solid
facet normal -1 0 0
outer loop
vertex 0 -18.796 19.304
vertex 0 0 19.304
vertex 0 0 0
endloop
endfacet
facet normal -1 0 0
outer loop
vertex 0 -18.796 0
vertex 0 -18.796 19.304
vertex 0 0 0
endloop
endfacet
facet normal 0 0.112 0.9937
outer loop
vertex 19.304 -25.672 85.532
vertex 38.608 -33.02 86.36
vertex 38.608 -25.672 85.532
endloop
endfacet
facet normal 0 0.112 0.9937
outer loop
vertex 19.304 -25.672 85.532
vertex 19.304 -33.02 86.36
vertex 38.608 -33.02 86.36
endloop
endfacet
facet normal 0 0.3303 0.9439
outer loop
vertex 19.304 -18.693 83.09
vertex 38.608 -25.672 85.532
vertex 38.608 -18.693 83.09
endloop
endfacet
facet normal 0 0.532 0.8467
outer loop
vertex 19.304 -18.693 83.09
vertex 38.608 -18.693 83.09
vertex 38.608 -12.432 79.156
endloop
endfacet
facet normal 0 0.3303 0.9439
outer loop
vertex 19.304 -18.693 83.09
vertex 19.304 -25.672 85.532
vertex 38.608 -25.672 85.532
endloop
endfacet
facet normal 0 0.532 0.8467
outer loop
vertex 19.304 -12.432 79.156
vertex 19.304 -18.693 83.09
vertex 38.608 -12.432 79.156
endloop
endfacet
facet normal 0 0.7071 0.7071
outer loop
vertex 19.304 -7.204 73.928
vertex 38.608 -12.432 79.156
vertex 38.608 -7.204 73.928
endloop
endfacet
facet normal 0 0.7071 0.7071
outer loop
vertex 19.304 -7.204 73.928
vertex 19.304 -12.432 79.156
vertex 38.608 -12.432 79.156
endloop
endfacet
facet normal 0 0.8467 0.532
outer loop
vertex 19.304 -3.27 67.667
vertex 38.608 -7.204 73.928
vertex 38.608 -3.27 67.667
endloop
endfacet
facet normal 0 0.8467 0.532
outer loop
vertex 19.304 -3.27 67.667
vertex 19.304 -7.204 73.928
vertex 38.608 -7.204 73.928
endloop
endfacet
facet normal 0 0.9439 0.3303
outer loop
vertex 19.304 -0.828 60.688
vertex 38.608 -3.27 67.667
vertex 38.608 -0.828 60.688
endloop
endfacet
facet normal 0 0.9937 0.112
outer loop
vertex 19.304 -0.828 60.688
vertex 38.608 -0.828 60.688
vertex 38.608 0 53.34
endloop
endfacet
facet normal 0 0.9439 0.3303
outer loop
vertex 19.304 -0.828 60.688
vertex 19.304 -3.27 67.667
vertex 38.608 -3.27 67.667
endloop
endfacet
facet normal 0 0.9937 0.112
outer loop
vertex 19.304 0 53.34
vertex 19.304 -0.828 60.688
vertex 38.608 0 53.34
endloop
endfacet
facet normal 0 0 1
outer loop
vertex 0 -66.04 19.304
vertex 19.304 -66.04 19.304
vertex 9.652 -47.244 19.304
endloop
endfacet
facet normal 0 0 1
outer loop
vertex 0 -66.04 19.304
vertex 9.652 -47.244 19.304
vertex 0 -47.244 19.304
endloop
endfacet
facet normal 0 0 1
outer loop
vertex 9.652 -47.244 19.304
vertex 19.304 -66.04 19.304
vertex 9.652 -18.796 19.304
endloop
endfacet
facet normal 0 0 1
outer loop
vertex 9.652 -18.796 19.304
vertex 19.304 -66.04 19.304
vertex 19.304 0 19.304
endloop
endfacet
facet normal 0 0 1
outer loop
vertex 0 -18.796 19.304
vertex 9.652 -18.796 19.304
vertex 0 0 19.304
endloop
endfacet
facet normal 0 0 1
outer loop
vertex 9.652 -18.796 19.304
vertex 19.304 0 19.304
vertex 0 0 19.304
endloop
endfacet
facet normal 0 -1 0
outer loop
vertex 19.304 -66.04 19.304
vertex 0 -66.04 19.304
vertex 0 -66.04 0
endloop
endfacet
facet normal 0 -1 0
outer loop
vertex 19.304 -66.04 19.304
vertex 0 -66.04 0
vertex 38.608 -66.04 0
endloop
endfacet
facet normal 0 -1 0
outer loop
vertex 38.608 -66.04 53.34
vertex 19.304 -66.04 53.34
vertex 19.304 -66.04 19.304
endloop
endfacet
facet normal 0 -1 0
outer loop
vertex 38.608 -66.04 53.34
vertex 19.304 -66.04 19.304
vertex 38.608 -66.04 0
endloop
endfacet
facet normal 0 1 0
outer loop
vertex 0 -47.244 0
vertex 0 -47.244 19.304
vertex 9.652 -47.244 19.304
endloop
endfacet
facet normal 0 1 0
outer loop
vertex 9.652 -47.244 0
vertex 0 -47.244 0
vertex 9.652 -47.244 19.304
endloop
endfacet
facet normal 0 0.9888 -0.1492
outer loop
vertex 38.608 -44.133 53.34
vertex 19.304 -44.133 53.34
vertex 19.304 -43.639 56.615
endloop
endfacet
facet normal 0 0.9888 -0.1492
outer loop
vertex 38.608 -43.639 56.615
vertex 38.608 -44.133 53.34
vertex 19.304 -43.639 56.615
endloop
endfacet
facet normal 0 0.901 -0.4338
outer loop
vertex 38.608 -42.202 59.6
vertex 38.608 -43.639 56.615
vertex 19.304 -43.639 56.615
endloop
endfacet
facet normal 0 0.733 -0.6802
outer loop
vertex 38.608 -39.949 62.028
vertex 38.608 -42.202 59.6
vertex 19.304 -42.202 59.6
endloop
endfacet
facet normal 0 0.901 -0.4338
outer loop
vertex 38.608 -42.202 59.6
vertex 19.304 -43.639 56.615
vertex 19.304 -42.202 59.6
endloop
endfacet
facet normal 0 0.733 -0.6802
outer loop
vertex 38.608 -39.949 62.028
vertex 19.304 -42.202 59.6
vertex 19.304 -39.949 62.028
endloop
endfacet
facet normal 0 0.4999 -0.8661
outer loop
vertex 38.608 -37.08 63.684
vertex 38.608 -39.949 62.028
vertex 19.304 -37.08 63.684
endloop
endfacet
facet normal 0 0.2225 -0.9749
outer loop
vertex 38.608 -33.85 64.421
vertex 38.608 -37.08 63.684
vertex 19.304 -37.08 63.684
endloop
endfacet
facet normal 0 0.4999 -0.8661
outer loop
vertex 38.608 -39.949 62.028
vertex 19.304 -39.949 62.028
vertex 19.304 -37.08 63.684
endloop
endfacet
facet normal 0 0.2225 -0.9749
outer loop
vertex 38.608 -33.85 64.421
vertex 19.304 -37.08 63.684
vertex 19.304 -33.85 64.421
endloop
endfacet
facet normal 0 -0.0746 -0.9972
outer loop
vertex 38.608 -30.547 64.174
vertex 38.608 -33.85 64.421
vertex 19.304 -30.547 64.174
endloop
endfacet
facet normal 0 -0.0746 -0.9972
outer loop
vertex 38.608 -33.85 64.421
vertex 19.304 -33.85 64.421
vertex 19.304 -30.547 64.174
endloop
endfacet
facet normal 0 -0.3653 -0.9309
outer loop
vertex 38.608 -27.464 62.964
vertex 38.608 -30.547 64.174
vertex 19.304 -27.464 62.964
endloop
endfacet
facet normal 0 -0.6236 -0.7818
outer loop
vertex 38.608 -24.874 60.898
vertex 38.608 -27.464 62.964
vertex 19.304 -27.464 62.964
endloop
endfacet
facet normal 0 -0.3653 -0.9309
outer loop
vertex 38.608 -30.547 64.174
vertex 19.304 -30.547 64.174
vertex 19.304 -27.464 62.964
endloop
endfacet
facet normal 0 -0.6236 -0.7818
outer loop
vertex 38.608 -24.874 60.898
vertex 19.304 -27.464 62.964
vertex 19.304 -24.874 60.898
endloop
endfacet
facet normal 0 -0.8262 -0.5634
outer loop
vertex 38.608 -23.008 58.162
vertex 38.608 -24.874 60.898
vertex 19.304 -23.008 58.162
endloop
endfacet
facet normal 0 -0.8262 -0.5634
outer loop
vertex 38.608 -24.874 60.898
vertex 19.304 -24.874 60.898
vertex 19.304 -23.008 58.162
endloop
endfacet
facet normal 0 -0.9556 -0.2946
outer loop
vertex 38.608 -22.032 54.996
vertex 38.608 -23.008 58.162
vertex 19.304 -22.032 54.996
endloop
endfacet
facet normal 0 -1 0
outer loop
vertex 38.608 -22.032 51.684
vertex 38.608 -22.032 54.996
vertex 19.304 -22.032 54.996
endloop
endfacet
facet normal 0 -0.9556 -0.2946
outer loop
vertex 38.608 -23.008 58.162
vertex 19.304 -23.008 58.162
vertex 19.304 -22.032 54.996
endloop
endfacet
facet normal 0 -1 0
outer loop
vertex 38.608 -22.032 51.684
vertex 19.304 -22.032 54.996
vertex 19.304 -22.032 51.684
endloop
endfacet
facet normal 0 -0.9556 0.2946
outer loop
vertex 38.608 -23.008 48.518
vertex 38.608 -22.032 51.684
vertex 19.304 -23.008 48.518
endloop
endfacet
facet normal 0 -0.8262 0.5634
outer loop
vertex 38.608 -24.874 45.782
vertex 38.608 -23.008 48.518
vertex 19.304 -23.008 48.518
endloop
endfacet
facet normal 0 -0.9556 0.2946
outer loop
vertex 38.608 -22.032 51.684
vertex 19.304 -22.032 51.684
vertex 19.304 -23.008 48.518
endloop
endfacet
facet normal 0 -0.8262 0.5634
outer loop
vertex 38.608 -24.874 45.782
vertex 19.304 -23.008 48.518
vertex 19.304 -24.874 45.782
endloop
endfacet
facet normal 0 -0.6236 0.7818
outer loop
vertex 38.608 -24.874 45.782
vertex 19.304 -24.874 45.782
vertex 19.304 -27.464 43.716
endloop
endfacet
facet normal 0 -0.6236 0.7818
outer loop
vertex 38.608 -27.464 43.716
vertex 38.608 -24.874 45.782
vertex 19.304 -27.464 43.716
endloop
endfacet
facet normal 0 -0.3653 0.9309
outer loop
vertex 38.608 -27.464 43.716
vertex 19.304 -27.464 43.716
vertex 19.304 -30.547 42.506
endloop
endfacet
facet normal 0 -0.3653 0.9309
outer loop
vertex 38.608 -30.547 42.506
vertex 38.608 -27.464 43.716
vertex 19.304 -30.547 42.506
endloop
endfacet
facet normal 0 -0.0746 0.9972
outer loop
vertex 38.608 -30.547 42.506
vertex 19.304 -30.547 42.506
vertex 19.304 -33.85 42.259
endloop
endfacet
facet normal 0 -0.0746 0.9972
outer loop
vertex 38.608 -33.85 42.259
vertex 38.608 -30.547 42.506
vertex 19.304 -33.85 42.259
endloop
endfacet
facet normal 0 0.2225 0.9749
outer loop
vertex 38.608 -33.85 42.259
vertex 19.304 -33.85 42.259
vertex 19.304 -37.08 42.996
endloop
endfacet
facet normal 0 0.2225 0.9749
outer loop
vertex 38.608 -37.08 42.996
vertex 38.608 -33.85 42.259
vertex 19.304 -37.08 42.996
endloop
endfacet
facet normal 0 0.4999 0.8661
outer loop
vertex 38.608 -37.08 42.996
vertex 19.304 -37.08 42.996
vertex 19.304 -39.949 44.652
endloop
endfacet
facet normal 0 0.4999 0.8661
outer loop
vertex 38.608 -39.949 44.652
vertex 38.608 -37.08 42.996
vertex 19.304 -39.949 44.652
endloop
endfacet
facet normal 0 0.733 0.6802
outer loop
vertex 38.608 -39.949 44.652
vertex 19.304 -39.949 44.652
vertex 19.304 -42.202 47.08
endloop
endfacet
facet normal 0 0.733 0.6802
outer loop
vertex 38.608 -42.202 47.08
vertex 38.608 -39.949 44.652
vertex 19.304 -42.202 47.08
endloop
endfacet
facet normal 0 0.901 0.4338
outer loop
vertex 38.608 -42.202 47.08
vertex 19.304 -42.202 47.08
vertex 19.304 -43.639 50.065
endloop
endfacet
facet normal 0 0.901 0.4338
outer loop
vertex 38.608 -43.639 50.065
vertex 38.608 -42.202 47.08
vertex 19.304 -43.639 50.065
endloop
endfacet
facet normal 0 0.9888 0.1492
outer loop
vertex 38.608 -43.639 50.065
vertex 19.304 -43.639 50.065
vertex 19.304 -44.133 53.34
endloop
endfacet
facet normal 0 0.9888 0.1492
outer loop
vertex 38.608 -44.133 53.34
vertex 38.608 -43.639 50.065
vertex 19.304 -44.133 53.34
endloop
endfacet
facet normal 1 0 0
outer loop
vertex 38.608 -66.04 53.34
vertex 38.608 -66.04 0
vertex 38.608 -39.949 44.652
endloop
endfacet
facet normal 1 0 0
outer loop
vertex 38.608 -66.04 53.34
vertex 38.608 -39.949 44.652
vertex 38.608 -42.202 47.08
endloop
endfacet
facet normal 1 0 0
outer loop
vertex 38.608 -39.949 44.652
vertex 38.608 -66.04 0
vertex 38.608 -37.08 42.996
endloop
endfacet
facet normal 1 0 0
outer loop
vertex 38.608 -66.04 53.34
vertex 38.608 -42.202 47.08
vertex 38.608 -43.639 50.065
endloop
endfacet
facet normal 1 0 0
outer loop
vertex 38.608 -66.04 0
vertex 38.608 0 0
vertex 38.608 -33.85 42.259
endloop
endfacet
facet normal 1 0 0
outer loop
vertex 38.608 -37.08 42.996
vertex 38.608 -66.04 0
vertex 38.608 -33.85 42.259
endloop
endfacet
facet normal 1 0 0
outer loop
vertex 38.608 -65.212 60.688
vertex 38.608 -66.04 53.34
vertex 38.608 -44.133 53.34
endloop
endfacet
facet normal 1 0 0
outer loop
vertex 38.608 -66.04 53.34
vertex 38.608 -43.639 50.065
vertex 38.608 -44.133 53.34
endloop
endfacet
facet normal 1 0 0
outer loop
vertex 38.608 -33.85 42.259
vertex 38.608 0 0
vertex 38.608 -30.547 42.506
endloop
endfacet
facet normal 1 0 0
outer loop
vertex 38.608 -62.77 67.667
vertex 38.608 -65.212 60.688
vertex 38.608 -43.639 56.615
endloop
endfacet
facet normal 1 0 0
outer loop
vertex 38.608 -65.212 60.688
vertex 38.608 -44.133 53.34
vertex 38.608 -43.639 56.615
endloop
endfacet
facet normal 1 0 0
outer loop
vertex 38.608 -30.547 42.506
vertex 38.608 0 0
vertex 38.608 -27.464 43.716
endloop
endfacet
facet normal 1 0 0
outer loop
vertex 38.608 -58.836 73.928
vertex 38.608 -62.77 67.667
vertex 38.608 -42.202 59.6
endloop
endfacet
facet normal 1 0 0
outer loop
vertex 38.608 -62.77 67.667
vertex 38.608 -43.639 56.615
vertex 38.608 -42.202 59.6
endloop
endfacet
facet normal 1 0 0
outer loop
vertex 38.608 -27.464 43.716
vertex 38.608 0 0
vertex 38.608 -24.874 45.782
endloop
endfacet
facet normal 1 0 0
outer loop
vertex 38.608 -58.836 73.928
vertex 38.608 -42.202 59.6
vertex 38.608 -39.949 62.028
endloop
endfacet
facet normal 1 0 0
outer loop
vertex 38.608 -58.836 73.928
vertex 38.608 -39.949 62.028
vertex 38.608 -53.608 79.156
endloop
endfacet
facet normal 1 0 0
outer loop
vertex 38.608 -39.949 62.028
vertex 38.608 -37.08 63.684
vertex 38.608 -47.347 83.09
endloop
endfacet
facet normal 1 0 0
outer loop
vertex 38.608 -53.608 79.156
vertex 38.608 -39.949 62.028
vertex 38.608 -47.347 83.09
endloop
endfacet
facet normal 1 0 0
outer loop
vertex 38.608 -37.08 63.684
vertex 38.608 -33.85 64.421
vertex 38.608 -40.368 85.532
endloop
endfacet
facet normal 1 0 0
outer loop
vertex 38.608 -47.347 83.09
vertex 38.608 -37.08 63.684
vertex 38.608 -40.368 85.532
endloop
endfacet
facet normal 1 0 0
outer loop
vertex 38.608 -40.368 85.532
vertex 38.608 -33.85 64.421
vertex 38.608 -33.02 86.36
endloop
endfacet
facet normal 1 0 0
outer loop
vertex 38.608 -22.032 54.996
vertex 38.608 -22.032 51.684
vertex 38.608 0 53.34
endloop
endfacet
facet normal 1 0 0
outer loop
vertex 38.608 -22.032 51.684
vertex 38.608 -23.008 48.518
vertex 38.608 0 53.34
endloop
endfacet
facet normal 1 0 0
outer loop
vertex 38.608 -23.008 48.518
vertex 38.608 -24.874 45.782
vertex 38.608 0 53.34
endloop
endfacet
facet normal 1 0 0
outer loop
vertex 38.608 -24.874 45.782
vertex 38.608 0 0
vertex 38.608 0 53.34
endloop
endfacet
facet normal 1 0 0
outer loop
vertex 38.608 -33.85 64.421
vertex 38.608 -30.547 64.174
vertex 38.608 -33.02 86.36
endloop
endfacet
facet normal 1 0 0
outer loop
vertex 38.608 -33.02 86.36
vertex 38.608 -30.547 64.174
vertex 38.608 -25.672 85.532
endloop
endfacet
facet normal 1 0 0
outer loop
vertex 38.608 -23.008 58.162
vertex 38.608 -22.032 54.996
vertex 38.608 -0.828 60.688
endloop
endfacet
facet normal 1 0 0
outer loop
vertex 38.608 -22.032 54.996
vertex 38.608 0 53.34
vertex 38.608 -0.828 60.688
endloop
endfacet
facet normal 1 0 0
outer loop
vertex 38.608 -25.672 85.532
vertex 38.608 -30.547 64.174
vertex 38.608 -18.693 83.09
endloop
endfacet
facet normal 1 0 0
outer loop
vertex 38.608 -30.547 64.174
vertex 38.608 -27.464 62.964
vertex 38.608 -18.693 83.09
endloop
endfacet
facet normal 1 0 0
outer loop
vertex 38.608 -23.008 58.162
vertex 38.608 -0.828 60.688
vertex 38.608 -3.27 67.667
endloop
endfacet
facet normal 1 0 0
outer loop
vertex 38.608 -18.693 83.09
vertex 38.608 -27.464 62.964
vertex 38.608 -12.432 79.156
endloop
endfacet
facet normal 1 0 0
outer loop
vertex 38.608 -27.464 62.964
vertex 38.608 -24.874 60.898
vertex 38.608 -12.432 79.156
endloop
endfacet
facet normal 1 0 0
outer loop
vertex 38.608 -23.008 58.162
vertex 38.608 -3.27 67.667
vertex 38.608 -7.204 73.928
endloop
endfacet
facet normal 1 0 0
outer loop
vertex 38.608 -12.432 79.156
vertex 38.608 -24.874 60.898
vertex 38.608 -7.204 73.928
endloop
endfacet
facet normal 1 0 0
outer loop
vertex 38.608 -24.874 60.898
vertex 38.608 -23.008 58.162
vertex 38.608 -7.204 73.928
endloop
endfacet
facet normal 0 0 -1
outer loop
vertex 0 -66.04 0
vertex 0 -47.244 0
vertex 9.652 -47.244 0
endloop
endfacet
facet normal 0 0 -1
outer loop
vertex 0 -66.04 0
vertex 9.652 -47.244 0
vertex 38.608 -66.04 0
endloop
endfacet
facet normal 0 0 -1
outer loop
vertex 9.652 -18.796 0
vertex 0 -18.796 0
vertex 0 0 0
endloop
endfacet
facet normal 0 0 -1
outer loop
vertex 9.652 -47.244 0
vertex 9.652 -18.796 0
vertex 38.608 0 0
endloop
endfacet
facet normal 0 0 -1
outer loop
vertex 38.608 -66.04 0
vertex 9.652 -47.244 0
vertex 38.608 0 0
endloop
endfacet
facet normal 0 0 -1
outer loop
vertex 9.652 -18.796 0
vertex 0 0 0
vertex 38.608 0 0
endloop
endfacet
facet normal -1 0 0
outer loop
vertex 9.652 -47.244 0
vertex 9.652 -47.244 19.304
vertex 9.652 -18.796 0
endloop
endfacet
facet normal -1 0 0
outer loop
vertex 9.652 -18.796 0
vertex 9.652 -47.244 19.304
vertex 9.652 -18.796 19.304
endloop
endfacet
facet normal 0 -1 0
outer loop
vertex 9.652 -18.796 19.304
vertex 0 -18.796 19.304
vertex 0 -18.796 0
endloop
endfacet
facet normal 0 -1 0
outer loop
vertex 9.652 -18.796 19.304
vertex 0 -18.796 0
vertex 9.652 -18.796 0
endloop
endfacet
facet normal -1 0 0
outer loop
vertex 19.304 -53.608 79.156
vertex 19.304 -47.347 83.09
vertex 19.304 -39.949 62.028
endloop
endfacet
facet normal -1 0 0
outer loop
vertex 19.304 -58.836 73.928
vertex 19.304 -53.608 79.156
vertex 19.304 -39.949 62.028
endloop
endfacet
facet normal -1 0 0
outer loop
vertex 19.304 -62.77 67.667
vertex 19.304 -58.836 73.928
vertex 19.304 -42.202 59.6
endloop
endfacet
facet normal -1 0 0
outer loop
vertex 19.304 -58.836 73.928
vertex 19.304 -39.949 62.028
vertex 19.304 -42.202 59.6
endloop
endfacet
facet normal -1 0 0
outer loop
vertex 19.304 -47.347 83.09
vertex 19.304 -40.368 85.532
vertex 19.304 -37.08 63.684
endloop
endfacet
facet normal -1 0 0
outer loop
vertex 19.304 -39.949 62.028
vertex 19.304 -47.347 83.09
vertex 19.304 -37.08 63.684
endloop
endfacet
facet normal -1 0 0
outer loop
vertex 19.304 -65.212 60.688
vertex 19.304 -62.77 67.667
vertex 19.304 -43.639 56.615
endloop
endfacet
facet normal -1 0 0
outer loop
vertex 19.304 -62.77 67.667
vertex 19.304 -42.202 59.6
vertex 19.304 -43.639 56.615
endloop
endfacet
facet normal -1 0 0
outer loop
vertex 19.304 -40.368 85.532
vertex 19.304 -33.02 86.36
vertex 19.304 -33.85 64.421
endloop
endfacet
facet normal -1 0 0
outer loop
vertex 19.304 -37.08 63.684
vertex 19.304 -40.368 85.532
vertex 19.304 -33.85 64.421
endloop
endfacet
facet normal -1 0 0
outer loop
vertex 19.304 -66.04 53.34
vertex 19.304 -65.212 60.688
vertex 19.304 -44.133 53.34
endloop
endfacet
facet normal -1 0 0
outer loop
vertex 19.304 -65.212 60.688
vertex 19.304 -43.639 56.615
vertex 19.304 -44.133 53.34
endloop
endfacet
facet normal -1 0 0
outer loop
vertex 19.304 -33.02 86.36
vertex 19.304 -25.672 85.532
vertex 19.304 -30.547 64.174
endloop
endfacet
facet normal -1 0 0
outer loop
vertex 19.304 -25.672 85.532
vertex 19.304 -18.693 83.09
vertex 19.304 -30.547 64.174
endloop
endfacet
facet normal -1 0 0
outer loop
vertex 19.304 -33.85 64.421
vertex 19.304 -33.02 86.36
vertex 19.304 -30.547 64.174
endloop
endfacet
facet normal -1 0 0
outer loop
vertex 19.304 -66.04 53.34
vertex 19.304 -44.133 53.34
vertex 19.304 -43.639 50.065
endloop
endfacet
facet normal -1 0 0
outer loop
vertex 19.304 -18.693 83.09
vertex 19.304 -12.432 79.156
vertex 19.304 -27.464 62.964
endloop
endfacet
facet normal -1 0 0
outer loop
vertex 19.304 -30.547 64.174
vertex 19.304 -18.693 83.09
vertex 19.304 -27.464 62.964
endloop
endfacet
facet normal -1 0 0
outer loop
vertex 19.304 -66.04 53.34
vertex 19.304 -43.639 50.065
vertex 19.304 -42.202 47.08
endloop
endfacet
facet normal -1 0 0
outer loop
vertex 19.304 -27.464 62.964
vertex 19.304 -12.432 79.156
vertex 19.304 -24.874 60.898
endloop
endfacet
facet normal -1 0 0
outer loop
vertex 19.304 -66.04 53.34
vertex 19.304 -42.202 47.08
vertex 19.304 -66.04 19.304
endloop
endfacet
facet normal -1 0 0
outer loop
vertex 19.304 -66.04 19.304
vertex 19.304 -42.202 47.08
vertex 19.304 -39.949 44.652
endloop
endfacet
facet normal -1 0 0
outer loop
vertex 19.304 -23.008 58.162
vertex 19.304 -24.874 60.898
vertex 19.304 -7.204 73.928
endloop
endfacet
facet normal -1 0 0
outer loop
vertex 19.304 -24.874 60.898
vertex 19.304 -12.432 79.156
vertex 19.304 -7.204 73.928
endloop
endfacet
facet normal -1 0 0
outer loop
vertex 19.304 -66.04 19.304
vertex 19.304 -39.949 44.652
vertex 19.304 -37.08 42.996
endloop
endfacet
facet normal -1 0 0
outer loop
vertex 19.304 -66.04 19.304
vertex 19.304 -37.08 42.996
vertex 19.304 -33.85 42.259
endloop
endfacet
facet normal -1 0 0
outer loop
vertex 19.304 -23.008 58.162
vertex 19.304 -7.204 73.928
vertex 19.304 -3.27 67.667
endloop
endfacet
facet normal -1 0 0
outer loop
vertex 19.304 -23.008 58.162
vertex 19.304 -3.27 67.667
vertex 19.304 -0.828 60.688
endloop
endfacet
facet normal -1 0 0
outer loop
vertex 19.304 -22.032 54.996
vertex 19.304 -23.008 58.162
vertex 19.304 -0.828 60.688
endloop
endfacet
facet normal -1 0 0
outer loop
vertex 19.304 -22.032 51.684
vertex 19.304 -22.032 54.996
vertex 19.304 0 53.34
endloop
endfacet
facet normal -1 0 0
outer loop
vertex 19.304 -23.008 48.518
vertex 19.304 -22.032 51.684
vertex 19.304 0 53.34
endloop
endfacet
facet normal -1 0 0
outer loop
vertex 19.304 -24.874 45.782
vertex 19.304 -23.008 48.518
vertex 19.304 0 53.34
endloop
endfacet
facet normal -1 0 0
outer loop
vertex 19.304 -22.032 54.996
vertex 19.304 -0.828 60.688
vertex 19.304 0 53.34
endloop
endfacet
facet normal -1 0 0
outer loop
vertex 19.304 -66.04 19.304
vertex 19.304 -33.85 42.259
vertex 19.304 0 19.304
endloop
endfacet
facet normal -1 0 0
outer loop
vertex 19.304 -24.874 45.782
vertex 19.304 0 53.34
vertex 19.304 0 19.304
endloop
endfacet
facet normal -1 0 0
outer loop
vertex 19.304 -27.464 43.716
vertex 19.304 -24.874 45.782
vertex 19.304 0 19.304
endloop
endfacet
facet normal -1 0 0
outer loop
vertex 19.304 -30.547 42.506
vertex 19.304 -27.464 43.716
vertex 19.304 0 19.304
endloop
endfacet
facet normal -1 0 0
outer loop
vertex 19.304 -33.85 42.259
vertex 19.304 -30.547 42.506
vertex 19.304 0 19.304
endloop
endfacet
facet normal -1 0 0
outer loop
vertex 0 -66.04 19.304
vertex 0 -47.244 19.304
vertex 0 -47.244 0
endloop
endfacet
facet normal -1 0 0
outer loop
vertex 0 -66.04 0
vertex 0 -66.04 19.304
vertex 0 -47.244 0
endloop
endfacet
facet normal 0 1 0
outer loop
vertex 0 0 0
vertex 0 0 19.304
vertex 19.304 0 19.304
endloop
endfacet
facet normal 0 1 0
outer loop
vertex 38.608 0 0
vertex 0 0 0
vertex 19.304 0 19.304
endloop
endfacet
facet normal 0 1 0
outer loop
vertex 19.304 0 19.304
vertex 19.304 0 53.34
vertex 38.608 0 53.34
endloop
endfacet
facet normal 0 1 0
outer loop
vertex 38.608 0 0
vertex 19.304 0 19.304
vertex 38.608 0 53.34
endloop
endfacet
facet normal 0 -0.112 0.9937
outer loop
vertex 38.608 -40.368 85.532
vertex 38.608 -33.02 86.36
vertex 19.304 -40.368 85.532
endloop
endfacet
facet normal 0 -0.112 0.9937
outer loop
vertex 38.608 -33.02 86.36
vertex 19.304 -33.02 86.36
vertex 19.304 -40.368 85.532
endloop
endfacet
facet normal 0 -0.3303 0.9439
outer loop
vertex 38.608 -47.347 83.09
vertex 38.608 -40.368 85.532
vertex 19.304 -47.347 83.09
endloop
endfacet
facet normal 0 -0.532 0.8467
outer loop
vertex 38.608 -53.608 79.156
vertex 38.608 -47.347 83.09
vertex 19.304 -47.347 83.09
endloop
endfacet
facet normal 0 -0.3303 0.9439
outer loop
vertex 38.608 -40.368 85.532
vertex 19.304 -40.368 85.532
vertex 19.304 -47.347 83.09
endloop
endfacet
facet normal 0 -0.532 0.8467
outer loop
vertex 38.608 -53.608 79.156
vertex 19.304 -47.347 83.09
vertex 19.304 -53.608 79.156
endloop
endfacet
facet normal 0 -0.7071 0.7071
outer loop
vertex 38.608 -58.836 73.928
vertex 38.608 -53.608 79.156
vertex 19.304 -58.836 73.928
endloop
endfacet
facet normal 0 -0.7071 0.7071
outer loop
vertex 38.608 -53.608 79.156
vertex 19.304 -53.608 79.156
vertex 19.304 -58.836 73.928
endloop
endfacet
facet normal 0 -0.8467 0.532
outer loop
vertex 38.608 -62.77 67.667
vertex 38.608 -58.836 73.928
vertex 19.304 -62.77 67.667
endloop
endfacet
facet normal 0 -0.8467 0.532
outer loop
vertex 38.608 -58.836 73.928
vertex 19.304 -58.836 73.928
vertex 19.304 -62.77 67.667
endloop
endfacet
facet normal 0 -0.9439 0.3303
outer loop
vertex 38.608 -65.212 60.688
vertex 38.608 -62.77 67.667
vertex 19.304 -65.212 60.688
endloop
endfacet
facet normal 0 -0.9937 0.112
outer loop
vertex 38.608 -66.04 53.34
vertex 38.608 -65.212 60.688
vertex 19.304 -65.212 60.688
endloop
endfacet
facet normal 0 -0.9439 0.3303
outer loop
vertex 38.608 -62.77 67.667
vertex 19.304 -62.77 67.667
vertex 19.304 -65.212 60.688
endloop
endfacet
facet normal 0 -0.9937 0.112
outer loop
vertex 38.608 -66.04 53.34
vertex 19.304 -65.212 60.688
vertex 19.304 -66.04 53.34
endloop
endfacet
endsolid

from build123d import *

# Parameters (mm, degrees)
F1_DEPTH = 66.04
F2_R     = 33.01999
F4_W     = 9.652
F4_H     = 28.448
F5_DEPTH = 30.226
F3_R     = 11.1125
F6_DEPTH = 63.246


# Not quite as in the source:
# - a fillet or chamfer is up to 0.001 mm smaller than in the source, because OpenCascade refuses the exact size


with BuildPart() as f1:
    # F0 (on Front) → F1 (new body)
    with BuildSketch(Plane.XZ):
        Polygon((0, 19.304), (0, 0), (38.608, 0), (38.608, 86.36), (19.304, 86.36), (19.304, 19.304), align=None)
    extrude(amount=F1_DEPTH)

    # F2 (radius 33.02 in the source; OpenCascade refuses exactly that, so slightly less here)
    f2_edges = [f1.edges().sort_by_distance(p)[0] for p in [
        (28.956, -66.04, 86.36),
        (28.956, 0, 86.36),
    ]]
    fillet(f2_edges, radius=F2_R)

    # F4 (on face) → F5 (cut)
    with BuildSketch(Plane.XY.offset(19.304)):
        with Locations((4.826, -33.02)):
            Rectangle(F4_W, F4_H)
    extrude(amount=-F5_DEPTH, mode=Mode.SUBTRACT)

    # F3 (on face) → F6 (cut)
    with BuildSketch(Plane(origin=(19.304, 0, 0), x_dir=(0, -1, 0), z_dir=(-1, 0, 0))):
        with Locations((33.02, 53.34)):
            Circle(F3_R)
    extrude(amount=-F6_DEPTH, mode=Mode.SUBTRACT)


solid = f1.part
